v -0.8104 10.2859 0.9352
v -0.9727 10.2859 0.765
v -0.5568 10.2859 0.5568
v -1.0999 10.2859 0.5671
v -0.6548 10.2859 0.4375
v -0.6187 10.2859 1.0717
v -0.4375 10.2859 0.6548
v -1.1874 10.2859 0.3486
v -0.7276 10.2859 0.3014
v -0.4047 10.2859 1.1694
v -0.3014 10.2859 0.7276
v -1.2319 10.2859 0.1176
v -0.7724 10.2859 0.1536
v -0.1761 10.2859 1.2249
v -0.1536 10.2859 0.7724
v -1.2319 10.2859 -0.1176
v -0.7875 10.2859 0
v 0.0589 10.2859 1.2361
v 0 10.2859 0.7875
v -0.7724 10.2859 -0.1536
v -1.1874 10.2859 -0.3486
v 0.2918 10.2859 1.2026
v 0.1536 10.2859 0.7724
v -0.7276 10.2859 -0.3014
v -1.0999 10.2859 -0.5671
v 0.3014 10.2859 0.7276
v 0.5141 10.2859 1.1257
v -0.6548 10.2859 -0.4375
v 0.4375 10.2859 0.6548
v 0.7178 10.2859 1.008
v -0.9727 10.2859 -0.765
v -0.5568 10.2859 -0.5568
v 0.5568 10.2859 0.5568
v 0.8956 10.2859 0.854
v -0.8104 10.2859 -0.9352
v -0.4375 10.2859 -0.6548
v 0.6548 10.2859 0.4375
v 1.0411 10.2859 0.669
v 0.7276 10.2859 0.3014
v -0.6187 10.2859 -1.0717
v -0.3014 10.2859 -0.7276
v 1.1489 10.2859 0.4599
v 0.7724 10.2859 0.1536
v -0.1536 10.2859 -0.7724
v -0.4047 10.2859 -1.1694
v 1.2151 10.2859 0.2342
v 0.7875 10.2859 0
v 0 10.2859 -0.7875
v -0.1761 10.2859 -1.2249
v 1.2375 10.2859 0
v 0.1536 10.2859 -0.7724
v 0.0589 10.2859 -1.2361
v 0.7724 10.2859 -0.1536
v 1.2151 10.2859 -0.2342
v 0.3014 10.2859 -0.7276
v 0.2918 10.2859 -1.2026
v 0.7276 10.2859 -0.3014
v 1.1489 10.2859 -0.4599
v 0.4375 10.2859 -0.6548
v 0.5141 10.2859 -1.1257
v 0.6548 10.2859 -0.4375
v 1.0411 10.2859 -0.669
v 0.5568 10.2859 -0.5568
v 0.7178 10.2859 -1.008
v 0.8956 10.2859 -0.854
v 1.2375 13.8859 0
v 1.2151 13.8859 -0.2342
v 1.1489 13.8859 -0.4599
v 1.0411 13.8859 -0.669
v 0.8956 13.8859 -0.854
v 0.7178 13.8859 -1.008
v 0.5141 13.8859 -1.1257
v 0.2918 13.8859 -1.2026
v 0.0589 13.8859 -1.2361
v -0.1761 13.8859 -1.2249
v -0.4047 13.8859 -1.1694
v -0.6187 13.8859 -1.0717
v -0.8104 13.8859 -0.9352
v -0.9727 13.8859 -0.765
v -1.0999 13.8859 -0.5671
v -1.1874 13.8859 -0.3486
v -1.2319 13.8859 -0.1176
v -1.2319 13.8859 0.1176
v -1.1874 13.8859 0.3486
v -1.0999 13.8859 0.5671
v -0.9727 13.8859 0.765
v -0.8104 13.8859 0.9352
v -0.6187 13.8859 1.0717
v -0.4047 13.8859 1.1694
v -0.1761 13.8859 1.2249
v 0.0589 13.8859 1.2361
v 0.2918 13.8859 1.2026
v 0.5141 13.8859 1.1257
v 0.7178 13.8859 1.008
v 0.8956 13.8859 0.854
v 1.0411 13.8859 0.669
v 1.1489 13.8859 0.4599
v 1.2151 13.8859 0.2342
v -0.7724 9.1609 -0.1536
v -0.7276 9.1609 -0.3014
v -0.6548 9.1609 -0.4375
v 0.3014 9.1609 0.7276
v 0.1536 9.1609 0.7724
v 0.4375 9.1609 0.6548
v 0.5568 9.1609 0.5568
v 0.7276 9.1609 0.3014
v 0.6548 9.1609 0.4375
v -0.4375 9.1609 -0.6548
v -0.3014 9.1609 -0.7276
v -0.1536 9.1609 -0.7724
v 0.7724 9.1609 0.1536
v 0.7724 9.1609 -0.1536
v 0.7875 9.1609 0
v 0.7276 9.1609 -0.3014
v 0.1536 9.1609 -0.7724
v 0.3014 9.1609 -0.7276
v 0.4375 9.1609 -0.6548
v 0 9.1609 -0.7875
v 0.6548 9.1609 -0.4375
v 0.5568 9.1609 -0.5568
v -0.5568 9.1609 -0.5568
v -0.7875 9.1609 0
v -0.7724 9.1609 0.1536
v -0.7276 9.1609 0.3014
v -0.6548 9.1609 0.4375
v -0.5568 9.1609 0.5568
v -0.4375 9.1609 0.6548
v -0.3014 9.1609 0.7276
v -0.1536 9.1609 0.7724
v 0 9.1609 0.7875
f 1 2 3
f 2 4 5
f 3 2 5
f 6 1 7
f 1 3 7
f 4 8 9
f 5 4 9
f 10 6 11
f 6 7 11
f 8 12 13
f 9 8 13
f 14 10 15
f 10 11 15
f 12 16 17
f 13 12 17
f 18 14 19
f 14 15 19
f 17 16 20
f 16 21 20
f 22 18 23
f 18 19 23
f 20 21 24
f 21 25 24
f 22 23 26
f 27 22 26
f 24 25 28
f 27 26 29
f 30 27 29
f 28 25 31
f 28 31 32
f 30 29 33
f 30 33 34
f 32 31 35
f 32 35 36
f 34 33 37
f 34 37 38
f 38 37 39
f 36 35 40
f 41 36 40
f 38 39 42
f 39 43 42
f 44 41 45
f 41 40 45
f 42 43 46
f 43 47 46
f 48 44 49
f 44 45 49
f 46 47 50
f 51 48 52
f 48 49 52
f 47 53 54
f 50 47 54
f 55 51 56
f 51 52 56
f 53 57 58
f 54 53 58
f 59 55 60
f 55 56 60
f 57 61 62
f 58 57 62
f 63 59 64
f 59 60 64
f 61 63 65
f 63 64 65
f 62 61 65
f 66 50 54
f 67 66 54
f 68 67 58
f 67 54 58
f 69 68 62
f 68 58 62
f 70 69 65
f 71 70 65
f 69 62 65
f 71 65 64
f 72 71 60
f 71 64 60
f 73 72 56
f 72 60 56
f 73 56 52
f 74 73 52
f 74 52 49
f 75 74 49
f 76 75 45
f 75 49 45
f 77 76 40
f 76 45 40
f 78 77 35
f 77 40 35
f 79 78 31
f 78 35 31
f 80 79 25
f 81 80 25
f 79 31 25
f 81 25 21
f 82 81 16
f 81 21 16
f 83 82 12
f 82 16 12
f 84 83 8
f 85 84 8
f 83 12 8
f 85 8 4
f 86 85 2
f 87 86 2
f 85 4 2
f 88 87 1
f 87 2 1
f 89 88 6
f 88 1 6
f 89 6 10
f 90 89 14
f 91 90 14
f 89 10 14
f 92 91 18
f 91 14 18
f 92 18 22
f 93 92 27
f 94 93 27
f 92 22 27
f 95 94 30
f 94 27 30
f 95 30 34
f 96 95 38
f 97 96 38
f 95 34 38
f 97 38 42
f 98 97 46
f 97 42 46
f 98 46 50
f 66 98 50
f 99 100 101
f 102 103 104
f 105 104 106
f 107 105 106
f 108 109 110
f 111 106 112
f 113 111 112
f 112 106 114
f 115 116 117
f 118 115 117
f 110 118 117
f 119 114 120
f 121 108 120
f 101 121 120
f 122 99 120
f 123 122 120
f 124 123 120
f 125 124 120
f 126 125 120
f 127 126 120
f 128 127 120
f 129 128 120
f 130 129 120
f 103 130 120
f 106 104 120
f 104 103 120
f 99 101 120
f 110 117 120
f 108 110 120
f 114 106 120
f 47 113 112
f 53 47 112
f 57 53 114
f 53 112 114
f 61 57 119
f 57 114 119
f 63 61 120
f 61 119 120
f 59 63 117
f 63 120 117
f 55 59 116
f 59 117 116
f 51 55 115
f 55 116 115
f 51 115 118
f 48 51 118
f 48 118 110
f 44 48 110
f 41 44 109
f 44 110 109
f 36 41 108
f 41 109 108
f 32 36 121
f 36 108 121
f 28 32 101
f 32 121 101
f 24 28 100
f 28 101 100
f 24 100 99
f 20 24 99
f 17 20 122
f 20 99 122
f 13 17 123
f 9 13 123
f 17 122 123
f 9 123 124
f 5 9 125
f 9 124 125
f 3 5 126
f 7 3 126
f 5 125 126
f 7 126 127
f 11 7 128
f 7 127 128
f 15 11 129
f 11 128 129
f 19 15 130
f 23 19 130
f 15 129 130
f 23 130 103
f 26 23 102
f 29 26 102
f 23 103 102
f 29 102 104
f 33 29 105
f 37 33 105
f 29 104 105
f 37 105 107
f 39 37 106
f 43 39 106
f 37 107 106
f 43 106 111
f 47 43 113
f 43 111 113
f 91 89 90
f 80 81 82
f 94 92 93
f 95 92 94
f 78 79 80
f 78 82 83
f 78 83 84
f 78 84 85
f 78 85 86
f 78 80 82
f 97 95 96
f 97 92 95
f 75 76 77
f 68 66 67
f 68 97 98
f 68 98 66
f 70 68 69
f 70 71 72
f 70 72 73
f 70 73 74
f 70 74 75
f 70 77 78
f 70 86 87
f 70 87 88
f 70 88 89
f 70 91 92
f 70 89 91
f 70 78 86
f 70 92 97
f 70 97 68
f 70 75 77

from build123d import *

# Parameters (mm, degrees)
SKETCH1_R           = 3.5
BOSS_EXTRUDE1_DEPTH = 5
SKETCH2_R           = 5.5
BOSS_EXTRUDE2_DEPTH = 16
SCALE1_SCALE        = 0.225


with BuildPart() as part:
    # Sketch1 → Boss-Extrude1 (new body)
    with BuildSketch(Plane(origin=(0, 0, 0), x_dir=(1, 0, 0), z_dir=(0, 1, 0))):
        Circle(SKETCH1_R)
    extrude(amount=BOSS_EXTRUDE1_DEPTH)

    # Sketch2 → Boss-Extrude2 (add)
    with BuildSketch(Plane(origin=(0, 5, 0), x_dir=(1, 0, 0), z_dir=(0, 1, 0))):
        Circle(SKETCH2_R)
    extrude(amount=BOSS_EXTRUDE2_DEPTH)


with BuildPart() as part_1:
    # Scale1: scaled about (0, 11.820495186, 0)
    add(part.part.scale(SCALE1_SCALE).moved(Location((0, 9.160883769, 0))))


solid = part_1.part
